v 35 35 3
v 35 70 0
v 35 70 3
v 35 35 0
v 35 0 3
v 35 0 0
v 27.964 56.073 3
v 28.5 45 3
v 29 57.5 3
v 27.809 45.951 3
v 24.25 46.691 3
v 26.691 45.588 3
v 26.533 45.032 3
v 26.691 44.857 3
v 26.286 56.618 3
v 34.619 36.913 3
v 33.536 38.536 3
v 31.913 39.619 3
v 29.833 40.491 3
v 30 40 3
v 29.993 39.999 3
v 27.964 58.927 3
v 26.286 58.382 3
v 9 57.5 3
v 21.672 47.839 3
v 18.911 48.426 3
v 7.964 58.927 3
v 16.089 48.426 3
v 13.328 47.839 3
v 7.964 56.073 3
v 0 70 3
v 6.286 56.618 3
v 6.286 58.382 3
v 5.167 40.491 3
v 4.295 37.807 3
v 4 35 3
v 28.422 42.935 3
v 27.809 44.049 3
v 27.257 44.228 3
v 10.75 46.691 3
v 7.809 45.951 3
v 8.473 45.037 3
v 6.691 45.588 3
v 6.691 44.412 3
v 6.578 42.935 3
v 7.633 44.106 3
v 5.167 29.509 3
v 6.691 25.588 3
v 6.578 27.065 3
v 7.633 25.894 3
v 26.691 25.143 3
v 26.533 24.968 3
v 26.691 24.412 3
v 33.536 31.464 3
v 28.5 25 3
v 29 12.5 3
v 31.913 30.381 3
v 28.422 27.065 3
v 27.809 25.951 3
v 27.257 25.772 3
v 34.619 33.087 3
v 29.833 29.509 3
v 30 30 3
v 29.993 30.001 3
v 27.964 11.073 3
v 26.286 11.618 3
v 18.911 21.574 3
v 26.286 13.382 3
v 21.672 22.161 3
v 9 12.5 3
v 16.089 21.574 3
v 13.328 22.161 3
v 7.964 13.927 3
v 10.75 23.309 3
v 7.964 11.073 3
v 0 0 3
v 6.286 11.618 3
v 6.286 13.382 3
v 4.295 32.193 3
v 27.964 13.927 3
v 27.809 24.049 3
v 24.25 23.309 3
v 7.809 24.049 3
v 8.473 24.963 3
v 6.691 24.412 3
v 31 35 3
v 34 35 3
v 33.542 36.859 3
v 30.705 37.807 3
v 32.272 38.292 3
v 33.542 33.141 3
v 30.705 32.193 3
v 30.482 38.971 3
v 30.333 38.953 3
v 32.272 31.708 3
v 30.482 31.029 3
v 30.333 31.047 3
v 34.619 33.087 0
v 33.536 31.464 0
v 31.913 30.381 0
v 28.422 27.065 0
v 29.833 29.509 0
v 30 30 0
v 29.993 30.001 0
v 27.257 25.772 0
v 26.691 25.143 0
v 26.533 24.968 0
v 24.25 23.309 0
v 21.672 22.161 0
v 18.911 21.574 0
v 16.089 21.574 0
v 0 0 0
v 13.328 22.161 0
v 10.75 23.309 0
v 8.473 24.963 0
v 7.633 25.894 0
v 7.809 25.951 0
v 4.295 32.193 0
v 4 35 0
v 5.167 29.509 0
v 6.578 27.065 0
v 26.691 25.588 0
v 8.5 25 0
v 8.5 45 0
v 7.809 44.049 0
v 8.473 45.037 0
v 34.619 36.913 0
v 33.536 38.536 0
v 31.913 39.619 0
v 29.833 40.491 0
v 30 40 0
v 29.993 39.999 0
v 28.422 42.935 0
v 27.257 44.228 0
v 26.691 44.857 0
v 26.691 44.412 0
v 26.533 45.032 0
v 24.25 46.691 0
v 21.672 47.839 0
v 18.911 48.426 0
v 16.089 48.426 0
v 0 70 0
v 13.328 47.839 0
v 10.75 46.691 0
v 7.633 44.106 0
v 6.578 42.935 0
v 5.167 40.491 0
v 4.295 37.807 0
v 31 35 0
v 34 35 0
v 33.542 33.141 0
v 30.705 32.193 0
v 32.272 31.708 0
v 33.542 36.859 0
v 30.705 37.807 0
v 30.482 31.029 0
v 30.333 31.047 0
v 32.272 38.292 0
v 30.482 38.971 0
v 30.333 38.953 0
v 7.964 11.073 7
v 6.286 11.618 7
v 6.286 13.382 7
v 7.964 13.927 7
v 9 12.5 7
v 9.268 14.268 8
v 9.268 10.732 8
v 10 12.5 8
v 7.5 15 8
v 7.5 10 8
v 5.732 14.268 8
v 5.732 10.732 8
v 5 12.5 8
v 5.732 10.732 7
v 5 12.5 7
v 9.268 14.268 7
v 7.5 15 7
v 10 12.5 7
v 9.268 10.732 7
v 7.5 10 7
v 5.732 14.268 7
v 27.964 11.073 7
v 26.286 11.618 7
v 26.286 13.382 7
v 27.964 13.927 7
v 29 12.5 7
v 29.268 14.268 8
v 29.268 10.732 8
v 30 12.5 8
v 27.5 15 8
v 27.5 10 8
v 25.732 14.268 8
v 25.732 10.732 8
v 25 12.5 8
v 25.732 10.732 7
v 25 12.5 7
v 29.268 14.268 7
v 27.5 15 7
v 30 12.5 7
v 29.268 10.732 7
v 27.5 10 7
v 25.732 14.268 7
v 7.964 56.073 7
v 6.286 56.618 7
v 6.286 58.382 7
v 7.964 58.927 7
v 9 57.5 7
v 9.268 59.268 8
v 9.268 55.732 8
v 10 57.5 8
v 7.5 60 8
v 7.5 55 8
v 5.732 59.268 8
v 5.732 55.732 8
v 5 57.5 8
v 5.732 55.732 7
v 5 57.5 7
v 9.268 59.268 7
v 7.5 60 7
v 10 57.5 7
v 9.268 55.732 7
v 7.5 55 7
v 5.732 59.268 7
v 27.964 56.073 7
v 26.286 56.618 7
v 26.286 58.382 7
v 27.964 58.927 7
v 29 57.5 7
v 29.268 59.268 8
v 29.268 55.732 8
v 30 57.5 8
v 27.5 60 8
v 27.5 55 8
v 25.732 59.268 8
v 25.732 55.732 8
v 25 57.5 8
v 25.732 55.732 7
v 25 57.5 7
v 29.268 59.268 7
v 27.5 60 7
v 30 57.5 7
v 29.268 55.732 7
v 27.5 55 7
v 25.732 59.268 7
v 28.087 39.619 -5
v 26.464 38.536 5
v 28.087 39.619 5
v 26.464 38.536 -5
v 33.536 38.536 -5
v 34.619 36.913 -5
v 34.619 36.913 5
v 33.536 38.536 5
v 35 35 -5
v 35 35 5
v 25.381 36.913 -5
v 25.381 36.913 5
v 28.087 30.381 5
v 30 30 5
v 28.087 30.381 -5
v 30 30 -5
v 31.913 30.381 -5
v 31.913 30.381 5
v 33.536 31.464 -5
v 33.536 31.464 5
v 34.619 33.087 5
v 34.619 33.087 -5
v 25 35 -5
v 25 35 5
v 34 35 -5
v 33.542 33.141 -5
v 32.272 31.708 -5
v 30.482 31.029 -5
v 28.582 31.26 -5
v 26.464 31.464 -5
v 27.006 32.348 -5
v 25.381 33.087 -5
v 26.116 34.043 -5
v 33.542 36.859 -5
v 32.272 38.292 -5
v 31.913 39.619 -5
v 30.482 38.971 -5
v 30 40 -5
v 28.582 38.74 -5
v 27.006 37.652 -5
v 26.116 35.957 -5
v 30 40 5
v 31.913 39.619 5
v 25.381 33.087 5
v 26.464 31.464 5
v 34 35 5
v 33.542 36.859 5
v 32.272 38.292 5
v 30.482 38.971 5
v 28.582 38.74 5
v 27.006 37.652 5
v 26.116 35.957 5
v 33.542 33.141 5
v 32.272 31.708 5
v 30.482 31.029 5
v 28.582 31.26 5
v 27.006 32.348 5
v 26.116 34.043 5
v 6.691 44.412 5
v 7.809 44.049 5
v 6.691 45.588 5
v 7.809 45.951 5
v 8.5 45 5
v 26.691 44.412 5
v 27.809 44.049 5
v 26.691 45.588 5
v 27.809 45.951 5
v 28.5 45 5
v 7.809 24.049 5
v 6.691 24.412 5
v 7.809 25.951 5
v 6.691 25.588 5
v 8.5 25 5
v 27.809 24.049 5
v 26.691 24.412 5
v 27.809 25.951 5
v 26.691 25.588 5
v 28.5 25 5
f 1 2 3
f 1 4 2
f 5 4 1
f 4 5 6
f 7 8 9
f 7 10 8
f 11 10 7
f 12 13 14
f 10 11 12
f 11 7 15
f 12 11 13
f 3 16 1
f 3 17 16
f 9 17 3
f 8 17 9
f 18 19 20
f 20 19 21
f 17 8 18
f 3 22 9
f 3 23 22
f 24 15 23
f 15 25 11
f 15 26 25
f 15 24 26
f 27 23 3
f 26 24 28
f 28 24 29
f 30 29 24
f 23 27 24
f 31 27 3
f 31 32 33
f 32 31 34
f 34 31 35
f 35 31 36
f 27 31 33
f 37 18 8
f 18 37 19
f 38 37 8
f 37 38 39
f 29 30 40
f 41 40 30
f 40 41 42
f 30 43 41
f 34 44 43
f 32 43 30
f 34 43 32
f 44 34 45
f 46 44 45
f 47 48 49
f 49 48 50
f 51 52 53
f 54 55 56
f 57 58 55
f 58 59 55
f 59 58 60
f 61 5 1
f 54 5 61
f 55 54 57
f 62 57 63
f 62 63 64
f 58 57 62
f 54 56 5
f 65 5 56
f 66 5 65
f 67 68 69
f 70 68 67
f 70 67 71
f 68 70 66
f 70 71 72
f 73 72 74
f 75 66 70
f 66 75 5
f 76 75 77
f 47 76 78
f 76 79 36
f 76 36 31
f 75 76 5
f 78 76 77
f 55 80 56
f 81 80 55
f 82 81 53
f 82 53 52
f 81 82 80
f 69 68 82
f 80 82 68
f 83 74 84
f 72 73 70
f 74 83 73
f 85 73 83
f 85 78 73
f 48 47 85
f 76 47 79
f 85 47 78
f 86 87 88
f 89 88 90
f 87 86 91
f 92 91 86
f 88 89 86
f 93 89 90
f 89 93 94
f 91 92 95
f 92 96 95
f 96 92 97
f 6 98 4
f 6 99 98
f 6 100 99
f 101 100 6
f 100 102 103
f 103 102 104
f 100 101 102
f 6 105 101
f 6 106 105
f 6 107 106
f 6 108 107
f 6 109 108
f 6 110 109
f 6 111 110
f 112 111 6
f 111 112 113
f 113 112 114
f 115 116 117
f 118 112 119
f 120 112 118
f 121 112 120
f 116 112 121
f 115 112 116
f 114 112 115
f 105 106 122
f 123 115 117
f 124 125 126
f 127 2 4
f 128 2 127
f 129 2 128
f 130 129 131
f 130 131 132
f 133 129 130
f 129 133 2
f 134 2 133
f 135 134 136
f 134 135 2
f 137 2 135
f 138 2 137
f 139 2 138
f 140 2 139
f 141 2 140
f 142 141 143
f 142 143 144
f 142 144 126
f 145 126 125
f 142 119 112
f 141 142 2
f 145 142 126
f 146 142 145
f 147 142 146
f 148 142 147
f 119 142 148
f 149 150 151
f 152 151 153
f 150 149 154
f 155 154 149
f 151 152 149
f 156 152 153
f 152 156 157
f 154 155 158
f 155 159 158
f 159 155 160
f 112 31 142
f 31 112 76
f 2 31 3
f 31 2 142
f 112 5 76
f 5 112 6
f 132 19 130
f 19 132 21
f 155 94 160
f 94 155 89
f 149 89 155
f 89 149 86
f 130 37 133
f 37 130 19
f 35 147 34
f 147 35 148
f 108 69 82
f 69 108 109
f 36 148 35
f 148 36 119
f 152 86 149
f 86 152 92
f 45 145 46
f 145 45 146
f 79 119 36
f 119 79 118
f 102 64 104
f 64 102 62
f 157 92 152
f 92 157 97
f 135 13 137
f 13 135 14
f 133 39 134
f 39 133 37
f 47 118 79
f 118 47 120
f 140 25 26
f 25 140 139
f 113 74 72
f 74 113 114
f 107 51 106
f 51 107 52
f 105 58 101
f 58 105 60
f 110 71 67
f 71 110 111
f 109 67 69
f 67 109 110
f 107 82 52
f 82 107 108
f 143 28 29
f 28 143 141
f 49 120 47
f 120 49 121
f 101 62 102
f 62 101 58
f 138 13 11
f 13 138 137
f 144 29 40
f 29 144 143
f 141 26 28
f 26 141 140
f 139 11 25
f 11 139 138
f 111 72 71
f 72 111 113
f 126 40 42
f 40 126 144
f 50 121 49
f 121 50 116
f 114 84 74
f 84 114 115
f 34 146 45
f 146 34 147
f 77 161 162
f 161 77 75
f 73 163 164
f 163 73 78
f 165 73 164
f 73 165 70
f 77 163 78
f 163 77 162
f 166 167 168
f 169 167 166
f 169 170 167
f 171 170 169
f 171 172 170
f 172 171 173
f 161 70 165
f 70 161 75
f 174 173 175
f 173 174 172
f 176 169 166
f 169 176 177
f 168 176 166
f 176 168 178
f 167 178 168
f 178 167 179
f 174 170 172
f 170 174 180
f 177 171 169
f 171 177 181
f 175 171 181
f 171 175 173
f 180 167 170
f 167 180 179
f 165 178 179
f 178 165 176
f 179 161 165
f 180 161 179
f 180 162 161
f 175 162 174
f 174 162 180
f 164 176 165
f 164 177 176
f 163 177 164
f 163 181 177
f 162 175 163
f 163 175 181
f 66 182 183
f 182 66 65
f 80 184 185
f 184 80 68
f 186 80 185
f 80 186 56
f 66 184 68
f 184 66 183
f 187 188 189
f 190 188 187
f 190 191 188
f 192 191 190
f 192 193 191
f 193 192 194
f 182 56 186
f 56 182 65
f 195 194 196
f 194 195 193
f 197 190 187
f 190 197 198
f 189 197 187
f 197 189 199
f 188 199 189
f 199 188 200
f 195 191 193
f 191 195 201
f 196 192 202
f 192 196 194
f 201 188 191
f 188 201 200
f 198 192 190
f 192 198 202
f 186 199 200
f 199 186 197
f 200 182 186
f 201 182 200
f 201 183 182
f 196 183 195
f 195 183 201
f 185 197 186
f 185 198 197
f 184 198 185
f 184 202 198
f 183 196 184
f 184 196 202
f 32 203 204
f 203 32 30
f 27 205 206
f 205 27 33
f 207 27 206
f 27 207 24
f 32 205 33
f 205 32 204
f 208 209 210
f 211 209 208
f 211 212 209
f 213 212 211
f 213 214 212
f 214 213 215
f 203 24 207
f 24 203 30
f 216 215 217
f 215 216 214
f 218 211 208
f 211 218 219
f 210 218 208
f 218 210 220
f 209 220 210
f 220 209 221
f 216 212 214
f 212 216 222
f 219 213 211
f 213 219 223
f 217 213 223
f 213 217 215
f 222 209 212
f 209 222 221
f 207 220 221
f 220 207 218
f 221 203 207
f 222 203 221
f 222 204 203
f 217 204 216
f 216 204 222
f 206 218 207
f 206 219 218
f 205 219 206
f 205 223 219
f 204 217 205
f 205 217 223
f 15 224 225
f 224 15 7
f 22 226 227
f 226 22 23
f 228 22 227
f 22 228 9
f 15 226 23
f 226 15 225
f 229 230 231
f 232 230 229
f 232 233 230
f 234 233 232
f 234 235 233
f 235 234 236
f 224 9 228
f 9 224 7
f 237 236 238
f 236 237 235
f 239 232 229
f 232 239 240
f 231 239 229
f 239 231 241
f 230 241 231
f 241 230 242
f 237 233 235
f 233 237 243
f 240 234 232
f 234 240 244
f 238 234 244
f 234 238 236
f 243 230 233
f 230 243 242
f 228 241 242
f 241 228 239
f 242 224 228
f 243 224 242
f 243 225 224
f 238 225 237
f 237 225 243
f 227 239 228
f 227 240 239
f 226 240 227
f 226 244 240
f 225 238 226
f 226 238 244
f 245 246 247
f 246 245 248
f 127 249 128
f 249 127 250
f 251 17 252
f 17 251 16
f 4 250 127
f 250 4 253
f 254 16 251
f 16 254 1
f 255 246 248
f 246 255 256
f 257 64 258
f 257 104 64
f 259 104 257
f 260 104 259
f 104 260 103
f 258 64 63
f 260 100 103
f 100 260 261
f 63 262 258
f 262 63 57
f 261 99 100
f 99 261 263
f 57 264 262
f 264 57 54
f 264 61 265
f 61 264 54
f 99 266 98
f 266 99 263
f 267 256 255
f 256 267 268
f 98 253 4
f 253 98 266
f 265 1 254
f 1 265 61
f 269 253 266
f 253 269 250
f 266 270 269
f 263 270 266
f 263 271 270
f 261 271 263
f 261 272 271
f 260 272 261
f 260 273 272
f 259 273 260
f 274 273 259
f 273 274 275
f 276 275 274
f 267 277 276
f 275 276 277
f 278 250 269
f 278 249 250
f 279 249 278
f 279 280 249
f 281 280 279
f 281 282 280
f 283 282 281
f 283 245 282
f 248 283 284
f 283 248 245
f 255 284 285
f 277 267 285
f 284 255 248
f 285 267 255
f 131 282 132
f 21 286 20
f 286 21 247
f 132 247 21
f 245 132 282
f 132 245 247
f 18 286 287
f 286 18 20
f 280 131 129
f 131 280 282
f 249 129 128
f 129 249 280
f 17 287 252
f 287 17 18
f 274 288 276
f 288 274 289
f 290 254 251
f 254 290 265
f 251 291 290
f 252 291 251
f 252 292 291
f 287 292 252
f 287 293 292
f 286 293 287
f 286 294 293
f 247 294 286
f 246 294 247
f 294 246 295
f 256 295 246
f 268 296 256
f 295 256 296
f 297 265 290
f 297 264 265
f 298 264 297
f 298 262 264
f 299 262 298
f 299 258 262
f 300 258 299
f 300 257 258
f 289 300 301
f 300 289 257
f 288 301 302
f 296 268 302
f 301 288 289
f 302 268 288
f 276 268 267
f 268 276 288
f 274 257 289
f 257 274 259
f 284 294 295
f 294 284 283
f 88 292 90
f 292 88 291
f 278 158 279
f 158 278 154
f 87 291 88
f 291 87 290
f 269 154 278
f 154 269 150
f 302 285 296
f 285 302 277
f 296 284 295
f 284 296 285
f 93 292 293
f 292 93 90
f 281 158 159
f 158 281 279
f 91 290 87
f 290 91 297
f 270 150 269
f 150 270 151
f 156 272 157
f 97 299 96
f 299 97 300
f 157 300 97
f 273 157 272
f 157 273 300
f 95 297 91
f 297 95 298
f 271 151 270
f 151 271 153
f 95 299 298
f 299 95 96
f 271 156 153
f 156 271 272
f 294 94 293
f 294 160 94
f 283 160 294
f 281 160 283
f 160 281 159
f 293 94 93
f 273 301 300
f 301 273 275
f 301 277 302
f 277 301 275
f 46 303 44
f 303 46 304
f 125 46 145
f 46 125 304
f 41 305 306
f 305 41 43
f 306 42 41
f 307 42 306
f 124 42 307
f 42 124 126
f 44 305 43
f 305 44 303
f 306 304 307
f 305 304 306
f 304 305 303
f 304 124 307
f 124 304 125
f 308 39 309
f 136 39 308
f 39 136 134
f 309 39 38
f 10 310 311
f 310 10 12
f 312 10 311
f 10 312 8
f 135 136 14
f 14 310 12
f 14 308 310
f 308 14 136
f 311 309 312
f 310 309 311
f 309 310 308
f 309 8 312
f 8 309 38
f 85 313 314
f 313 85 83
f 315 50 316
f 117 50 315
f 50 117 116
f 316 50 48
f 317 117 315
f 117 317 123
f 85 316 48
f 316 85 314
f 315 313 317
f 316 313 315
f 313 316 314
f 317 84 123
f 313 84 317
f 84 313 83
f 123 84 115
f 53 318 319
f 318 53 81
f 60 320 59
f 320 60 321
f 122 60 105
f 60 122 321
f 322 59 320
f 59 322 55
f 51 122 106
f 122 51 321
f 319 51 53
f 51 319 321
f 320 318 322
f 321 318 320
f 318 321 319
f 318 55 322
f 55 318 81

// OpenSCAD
// Suporte para Monitor de Filamento ESP32
// Arquivo OpenSCAD Paramétrico
// Data: 2025-11-10
// Projeto: 3dPot - Monitor de Filamento WiFi

// ==================== PARÂMETROS ====================
// Todas as medidas em mm

// Dimensões do ESP32
esp32_width = 25.0;      // Largura do ESP32
esp32_length = 55.0;     // Comprimento do ESP32
esp32_height = 3.2;      // Altura do ESP32

// Dimensões do suporte base
base_width = 35.0;       // Largura da base
base_length = 70.0;      // Comprimento da base
base_height = 3.0;       // Altura da base

// Dimensões dos pinos de fixação
pin_diameter = 3.0;      // Diâmetro dos pinos
pin_height = 8.0;        // Altura dos pinos
pin_spacing_x = 20.0;    // Espaçamento entre pinos (eixo X)
pin_spacing_y = 45.0;    // Espaçamento entre pinos (eixo Y)

// Dimensões do alojamento do sensor
sensor_hole_diameter = 8.0;    // Diâmetro do furo do sensor
sensor_hole_depth = 5.0;       // Profundidade do furo do sensor

// Parâmetros de impressão
layer_height = 0.2;            // Altura da camada
wall_thickness = 1.2;          // Espessura da parede
bottom_thickness = 2.0;        // Espessura da base

// ==================== MODELAGEM ====================

module base_support() {
    // Base principal do suporte
    difference() {
        // Base sólida
        cube([base_width, base_length, base_height]);
        
        // Furo central para o ESP32
        translate([base_width/2, base_length/2, -1])
            cylinder(h = base_height + 2, d = esp32_width + 2);
    }
}

module mounting_pins() {
    // Posições dos pinos de fixação
    pin_positions = [
        [-pin_spacing_x/2, -pin_spacing_y/2, 0],
        [pin_spacing_x/2, -pin_spacing_y/2, 0],
        [-pin_spacing_x/2, pin_spacing_y/2, 0],
        [pin_spacing_x/2, pin_spacing_y/2, 0]
    ];
    
    for (pos = pin_positions) {
        translate([pos[0] + base_width/2, pos[1] + base_length/2, 0]) {
            // Pino cilíndrico
            cylinder(h = pin_height, d = pin_diameter);
            
            // Cabeça do pino (fita dupla face)
            translate([0, 0, pin_height - 1])
                cylinder(h = 1, d = pin_diameter + 2);
        }
    }
}

module sensor_housing() {
    // Alojamento para o sensor de peso
    translate([base_width/2 + esp32_width/2, base_length/2, -sensor_hole_depth]) {
        difference() {
            // Alojamento sólido
            cylinder(h = sensor_hole_depth + 5, d = sensor_hole_diameter + 2);
            
            // Furo para o sensor
            translate([0, 0, -1])
                cylinder(h = sensor_hole_depth + 7, d = sensor_hole_diameter);
        }
    }
}

module ventilation_holes() {
    // Furos de ventilação para o ESP32
    hole_positions = [
        [-10, 10, 0],
        [10, 10, 0],
        [-10, -10, 0],
        [10, -10, 0]
    ];
    
    for (pos = hole_positions) {
        translate([pos[0] + base_width/2, pos[1] + base_length/2, 0]) {
            cylinder(h = base_height + 2, d = 2);
        }
    }
}

// ==================== MONTAGEM FINAL ====================

// Base principal
base_support();

// Pinos de fixação
mounting_pins();

// Alojamento do sensor
sensor_housing();

// Furos de ventilação
ventilation_holes();

// ==================== INSTRUÇÕES DE IMPRESSÃO ====================

/*
INSTRUÇÕES DE IMPRESSÃO 3D:

1. PARÂMETROS RECOMENDADOS:
   - Material: PLA ou PETG
   - Temperatura: PLA (200-220°C) / PETG (220-250°C)
   - Altura da camada: 0.15-0.2mm
   - Velocidade: 50-60mm/s
   - Suporte: Desnecessário

2. ORIENTAÇÃO DE IMPRESSÃO:
   - Base para baixo, sem suporte
   - Pinos virados para cima

3. MONTAGEM:
   - Use fita dupla face nos pinos
   - Fixe o ESP32 centralmente
   - Posicione o sensor no alojamento
   - Use cola quentes se necessário

4. FUNCIONALIDADES:
   - Base estável para o ESP32
   - Pinos de fixação seguros
   - Alojamento para sensor de peso
   - Ventilação para resfriar o ESP32
   - Dimensões otimizadas para impressão

5. COMPATIBILIDADE:
   - ESP32 DevKit v1
   - Sensores de peso HX711
   - Display OLED 0.96"
   - Sensores de temperatura DHT22
*/
